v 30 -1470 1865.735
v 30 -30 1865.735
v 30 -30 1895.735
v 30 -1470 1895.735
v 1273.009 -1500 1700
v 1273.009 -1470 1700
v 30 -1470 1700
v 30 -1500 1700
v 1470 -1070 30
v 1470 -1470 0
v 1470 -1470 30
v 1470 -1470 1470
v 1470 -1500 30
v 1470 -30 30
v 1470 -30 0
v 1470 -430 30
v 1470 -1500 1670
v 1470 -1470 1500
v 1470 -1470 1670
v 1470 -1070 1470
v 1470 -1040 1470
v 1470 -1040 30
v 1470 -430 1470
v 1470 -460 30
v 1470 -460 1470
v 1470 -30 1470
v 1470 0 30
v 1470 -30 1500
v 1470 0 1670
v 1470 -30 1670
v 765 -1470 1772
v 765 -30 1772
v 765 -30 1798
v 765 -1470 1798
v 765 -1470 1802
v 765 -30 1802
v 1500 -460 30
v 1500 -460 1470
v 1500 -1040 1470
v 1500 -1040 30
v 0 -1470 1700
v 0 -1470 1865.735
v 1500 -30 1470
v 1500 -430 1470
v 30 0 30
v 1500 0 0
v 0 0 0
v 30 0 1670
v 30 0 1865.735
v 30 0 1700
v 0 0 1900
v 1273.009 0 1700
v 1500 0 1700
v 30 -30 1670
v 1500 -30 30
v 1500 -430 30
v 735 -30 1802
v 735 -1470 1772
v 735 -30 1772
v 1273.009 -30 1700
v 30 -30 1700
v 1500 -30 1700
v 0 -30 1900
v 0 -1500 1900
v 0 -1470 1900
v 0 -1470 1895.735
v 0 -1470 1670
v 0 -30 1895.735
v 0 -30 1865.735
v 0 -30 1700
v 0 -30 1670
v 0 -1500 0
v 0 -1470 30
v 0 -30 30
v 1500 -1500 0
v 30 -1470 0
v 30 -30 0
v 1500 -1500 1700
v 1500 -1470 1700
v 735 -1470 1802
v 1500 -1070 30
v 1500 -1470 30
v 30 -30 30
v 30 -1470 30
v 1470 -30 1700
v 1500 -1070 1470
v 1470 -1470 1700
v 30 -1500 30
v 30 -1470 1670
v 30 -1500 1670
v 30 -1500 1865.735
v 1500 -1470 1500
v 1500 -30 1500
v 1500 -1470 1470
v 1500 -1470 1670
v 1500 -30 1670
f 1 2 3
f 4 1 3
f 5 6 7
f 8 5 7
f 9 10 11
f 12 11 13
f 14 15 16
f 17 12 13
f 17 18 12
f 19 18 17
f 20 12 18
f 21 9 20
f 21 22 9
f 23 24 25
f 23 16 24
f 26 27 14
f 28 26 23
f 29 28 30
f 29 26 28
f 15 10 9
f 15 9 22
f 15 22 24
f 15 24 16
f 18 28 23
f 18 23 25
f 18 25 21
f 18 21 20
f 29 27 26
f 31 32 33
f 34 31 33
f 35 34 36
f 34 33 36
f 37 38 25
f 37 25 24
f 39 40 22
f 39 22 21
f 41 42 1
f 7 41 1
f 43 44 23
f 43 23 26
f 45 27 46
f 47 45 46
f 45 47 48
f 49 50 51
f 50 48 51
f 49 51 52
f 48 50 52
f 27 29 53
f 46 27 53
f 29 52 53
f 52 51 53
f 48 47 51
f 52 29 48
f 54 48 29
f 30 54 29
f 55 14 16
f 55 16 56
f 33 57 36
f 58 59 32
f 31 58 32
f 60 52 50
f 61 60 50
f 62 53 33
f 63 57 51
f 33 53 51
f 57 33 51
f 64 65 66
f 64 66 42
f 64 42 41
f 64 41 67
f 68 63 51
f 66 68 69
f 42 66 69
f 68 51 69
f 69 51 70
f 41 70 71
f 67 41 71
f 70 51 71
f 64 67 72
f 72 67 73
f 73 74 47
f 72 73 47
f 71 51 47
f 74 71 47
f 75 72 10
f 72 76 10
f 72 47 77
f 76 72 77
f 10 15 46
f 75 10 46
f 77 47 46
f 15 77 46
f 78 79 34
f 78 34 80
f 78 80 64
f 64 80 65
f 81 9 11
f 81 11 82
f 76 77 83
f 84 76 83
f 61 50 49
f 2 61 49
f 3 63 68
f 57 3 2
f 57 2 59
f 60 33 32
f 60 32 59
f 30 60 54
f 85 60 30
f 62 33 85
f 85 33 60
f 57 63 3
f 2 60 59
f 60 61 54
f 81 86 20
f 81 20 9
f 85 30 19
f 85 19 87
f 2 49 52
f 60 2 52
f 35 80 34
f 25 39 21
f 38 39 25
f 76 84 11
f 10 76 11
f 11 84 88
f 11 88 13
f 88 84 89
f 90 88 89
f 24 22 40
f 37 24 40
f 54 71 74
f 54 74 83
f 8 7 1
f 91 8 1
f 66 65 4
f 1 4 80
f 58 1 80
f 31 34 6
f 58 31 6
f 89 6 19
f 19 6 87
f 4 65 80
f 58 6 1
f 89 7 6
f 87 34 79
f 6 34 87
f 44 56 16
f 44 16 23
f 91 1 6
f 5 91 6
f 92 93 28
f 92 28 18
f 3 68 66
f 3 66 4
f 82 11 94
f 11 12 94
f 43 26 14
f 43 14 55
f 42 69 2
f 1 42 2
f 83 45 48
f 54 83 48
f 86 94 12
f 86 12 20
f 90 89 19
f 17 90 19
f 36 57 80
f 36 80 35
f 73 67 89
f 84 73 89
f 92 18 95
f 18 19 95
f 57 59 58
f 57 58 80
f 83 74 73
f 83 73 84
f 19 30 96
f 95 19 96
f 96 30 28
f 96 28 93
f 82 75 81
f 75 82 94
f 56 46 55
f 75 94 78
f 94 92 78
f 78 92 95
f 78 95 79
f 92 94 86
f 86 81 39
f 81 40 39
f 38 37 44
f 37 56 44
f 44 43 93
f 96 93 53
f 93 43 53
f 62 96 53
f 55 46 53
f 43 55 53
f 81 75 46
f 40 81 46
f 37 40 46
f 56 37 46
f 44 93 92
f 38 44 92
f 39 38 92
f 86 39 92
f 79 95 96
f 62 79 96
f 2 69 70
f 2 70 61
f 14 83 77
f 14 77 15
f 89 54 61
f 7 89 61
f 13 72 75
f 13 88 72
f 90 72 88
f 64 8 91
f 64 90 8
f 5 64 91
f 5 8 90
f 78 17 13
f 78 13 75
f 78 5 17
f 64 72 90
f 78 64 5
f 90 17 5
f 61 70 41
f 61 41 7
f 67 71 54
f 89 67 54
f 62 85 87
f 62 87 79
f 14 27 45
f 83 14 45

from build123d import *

# Parameters (mm, degrees)
F1_DEPTH = 30
F2_W     = 30
F2_H     = 30
F3_DEPTH = 1440
F4_W     = 1440
F4_H     = 1640
F5_DEPTH = 30
F7_DEPTH = 30


with BuildPart() as f1:
    # F0 (on Front) → F1 (new body)
    with BuildSketch(Plane.XZ):
        Polygon((0, 1700), (0, 0), (1500, 0), (1500, 1700), (0, 1900), align=None)
        Polygon((30, 1500), (30, 1670), (1470, 1670), (1470, 30), (30, 30), align=None, mode=Mode.SUBTRACT)
        Polygon((30, 1865.734508), (1273.008811, 1700), (30, 1700), align=None, mode=Mode.SUBTRACT)
    extrude(amount=F1_DEPTH)

    # F2 (on face) → F3 (join)
    with BuildSketch(Plane.XZ.offset(30)):
        with Locations((15, 15)):
            Rectangle(F2_W, F2_H)
        with Locations((1485, 15)):
            Rectangle(F2_W, F2_H)
        with Locations((15, 1685)):
            Rectangle(F2_W, F2_H)
        with Locations((1485, 1685)):
            Rectangle(F2_W, F2_H)
        with Locations((15, 1880.734508)):
            Rectangle(F2_W, F2_H)
        with Locations((750, 1787)):
            Rectangle(F2_W, F2_H)
    extrude(amount=F3_DEPTH)

    # F4 (on face) → F5 (join)
    with BuildSketch(Plane.XZ.offset(1470)):
        Polygon((0, 1900), (0, 0), (1500, 0), (1500, 1670), (1500, 1700), align=None)
        with Locations((750, 850)):
            Rectangle(F4_W, F4_H, mode=Mode.SUBTRACT)
        Polygon((30, 1700), (30, 1865.734508), (1273.008811, 1700), align=None, mode=Mode.SUBTRACT)
    extrude(amount=F5_DEPTH)

    # F6 (on face) → F7 (join)
    with BuildSketch(Plane.YZ.offset(1500)):
        Polygon((-1070, 1470), (-1070, 30), (-1040, 30), (-1040, 1470), (-460, 1470), (-460, 30), (-430, 30), (-430, 1470), (-30, 1470), (-30, 1500), (-1470, 1500), (-1470, 1470), align=None)
    extrude(amount=-F7_DEPTH)


solid = f1.part
